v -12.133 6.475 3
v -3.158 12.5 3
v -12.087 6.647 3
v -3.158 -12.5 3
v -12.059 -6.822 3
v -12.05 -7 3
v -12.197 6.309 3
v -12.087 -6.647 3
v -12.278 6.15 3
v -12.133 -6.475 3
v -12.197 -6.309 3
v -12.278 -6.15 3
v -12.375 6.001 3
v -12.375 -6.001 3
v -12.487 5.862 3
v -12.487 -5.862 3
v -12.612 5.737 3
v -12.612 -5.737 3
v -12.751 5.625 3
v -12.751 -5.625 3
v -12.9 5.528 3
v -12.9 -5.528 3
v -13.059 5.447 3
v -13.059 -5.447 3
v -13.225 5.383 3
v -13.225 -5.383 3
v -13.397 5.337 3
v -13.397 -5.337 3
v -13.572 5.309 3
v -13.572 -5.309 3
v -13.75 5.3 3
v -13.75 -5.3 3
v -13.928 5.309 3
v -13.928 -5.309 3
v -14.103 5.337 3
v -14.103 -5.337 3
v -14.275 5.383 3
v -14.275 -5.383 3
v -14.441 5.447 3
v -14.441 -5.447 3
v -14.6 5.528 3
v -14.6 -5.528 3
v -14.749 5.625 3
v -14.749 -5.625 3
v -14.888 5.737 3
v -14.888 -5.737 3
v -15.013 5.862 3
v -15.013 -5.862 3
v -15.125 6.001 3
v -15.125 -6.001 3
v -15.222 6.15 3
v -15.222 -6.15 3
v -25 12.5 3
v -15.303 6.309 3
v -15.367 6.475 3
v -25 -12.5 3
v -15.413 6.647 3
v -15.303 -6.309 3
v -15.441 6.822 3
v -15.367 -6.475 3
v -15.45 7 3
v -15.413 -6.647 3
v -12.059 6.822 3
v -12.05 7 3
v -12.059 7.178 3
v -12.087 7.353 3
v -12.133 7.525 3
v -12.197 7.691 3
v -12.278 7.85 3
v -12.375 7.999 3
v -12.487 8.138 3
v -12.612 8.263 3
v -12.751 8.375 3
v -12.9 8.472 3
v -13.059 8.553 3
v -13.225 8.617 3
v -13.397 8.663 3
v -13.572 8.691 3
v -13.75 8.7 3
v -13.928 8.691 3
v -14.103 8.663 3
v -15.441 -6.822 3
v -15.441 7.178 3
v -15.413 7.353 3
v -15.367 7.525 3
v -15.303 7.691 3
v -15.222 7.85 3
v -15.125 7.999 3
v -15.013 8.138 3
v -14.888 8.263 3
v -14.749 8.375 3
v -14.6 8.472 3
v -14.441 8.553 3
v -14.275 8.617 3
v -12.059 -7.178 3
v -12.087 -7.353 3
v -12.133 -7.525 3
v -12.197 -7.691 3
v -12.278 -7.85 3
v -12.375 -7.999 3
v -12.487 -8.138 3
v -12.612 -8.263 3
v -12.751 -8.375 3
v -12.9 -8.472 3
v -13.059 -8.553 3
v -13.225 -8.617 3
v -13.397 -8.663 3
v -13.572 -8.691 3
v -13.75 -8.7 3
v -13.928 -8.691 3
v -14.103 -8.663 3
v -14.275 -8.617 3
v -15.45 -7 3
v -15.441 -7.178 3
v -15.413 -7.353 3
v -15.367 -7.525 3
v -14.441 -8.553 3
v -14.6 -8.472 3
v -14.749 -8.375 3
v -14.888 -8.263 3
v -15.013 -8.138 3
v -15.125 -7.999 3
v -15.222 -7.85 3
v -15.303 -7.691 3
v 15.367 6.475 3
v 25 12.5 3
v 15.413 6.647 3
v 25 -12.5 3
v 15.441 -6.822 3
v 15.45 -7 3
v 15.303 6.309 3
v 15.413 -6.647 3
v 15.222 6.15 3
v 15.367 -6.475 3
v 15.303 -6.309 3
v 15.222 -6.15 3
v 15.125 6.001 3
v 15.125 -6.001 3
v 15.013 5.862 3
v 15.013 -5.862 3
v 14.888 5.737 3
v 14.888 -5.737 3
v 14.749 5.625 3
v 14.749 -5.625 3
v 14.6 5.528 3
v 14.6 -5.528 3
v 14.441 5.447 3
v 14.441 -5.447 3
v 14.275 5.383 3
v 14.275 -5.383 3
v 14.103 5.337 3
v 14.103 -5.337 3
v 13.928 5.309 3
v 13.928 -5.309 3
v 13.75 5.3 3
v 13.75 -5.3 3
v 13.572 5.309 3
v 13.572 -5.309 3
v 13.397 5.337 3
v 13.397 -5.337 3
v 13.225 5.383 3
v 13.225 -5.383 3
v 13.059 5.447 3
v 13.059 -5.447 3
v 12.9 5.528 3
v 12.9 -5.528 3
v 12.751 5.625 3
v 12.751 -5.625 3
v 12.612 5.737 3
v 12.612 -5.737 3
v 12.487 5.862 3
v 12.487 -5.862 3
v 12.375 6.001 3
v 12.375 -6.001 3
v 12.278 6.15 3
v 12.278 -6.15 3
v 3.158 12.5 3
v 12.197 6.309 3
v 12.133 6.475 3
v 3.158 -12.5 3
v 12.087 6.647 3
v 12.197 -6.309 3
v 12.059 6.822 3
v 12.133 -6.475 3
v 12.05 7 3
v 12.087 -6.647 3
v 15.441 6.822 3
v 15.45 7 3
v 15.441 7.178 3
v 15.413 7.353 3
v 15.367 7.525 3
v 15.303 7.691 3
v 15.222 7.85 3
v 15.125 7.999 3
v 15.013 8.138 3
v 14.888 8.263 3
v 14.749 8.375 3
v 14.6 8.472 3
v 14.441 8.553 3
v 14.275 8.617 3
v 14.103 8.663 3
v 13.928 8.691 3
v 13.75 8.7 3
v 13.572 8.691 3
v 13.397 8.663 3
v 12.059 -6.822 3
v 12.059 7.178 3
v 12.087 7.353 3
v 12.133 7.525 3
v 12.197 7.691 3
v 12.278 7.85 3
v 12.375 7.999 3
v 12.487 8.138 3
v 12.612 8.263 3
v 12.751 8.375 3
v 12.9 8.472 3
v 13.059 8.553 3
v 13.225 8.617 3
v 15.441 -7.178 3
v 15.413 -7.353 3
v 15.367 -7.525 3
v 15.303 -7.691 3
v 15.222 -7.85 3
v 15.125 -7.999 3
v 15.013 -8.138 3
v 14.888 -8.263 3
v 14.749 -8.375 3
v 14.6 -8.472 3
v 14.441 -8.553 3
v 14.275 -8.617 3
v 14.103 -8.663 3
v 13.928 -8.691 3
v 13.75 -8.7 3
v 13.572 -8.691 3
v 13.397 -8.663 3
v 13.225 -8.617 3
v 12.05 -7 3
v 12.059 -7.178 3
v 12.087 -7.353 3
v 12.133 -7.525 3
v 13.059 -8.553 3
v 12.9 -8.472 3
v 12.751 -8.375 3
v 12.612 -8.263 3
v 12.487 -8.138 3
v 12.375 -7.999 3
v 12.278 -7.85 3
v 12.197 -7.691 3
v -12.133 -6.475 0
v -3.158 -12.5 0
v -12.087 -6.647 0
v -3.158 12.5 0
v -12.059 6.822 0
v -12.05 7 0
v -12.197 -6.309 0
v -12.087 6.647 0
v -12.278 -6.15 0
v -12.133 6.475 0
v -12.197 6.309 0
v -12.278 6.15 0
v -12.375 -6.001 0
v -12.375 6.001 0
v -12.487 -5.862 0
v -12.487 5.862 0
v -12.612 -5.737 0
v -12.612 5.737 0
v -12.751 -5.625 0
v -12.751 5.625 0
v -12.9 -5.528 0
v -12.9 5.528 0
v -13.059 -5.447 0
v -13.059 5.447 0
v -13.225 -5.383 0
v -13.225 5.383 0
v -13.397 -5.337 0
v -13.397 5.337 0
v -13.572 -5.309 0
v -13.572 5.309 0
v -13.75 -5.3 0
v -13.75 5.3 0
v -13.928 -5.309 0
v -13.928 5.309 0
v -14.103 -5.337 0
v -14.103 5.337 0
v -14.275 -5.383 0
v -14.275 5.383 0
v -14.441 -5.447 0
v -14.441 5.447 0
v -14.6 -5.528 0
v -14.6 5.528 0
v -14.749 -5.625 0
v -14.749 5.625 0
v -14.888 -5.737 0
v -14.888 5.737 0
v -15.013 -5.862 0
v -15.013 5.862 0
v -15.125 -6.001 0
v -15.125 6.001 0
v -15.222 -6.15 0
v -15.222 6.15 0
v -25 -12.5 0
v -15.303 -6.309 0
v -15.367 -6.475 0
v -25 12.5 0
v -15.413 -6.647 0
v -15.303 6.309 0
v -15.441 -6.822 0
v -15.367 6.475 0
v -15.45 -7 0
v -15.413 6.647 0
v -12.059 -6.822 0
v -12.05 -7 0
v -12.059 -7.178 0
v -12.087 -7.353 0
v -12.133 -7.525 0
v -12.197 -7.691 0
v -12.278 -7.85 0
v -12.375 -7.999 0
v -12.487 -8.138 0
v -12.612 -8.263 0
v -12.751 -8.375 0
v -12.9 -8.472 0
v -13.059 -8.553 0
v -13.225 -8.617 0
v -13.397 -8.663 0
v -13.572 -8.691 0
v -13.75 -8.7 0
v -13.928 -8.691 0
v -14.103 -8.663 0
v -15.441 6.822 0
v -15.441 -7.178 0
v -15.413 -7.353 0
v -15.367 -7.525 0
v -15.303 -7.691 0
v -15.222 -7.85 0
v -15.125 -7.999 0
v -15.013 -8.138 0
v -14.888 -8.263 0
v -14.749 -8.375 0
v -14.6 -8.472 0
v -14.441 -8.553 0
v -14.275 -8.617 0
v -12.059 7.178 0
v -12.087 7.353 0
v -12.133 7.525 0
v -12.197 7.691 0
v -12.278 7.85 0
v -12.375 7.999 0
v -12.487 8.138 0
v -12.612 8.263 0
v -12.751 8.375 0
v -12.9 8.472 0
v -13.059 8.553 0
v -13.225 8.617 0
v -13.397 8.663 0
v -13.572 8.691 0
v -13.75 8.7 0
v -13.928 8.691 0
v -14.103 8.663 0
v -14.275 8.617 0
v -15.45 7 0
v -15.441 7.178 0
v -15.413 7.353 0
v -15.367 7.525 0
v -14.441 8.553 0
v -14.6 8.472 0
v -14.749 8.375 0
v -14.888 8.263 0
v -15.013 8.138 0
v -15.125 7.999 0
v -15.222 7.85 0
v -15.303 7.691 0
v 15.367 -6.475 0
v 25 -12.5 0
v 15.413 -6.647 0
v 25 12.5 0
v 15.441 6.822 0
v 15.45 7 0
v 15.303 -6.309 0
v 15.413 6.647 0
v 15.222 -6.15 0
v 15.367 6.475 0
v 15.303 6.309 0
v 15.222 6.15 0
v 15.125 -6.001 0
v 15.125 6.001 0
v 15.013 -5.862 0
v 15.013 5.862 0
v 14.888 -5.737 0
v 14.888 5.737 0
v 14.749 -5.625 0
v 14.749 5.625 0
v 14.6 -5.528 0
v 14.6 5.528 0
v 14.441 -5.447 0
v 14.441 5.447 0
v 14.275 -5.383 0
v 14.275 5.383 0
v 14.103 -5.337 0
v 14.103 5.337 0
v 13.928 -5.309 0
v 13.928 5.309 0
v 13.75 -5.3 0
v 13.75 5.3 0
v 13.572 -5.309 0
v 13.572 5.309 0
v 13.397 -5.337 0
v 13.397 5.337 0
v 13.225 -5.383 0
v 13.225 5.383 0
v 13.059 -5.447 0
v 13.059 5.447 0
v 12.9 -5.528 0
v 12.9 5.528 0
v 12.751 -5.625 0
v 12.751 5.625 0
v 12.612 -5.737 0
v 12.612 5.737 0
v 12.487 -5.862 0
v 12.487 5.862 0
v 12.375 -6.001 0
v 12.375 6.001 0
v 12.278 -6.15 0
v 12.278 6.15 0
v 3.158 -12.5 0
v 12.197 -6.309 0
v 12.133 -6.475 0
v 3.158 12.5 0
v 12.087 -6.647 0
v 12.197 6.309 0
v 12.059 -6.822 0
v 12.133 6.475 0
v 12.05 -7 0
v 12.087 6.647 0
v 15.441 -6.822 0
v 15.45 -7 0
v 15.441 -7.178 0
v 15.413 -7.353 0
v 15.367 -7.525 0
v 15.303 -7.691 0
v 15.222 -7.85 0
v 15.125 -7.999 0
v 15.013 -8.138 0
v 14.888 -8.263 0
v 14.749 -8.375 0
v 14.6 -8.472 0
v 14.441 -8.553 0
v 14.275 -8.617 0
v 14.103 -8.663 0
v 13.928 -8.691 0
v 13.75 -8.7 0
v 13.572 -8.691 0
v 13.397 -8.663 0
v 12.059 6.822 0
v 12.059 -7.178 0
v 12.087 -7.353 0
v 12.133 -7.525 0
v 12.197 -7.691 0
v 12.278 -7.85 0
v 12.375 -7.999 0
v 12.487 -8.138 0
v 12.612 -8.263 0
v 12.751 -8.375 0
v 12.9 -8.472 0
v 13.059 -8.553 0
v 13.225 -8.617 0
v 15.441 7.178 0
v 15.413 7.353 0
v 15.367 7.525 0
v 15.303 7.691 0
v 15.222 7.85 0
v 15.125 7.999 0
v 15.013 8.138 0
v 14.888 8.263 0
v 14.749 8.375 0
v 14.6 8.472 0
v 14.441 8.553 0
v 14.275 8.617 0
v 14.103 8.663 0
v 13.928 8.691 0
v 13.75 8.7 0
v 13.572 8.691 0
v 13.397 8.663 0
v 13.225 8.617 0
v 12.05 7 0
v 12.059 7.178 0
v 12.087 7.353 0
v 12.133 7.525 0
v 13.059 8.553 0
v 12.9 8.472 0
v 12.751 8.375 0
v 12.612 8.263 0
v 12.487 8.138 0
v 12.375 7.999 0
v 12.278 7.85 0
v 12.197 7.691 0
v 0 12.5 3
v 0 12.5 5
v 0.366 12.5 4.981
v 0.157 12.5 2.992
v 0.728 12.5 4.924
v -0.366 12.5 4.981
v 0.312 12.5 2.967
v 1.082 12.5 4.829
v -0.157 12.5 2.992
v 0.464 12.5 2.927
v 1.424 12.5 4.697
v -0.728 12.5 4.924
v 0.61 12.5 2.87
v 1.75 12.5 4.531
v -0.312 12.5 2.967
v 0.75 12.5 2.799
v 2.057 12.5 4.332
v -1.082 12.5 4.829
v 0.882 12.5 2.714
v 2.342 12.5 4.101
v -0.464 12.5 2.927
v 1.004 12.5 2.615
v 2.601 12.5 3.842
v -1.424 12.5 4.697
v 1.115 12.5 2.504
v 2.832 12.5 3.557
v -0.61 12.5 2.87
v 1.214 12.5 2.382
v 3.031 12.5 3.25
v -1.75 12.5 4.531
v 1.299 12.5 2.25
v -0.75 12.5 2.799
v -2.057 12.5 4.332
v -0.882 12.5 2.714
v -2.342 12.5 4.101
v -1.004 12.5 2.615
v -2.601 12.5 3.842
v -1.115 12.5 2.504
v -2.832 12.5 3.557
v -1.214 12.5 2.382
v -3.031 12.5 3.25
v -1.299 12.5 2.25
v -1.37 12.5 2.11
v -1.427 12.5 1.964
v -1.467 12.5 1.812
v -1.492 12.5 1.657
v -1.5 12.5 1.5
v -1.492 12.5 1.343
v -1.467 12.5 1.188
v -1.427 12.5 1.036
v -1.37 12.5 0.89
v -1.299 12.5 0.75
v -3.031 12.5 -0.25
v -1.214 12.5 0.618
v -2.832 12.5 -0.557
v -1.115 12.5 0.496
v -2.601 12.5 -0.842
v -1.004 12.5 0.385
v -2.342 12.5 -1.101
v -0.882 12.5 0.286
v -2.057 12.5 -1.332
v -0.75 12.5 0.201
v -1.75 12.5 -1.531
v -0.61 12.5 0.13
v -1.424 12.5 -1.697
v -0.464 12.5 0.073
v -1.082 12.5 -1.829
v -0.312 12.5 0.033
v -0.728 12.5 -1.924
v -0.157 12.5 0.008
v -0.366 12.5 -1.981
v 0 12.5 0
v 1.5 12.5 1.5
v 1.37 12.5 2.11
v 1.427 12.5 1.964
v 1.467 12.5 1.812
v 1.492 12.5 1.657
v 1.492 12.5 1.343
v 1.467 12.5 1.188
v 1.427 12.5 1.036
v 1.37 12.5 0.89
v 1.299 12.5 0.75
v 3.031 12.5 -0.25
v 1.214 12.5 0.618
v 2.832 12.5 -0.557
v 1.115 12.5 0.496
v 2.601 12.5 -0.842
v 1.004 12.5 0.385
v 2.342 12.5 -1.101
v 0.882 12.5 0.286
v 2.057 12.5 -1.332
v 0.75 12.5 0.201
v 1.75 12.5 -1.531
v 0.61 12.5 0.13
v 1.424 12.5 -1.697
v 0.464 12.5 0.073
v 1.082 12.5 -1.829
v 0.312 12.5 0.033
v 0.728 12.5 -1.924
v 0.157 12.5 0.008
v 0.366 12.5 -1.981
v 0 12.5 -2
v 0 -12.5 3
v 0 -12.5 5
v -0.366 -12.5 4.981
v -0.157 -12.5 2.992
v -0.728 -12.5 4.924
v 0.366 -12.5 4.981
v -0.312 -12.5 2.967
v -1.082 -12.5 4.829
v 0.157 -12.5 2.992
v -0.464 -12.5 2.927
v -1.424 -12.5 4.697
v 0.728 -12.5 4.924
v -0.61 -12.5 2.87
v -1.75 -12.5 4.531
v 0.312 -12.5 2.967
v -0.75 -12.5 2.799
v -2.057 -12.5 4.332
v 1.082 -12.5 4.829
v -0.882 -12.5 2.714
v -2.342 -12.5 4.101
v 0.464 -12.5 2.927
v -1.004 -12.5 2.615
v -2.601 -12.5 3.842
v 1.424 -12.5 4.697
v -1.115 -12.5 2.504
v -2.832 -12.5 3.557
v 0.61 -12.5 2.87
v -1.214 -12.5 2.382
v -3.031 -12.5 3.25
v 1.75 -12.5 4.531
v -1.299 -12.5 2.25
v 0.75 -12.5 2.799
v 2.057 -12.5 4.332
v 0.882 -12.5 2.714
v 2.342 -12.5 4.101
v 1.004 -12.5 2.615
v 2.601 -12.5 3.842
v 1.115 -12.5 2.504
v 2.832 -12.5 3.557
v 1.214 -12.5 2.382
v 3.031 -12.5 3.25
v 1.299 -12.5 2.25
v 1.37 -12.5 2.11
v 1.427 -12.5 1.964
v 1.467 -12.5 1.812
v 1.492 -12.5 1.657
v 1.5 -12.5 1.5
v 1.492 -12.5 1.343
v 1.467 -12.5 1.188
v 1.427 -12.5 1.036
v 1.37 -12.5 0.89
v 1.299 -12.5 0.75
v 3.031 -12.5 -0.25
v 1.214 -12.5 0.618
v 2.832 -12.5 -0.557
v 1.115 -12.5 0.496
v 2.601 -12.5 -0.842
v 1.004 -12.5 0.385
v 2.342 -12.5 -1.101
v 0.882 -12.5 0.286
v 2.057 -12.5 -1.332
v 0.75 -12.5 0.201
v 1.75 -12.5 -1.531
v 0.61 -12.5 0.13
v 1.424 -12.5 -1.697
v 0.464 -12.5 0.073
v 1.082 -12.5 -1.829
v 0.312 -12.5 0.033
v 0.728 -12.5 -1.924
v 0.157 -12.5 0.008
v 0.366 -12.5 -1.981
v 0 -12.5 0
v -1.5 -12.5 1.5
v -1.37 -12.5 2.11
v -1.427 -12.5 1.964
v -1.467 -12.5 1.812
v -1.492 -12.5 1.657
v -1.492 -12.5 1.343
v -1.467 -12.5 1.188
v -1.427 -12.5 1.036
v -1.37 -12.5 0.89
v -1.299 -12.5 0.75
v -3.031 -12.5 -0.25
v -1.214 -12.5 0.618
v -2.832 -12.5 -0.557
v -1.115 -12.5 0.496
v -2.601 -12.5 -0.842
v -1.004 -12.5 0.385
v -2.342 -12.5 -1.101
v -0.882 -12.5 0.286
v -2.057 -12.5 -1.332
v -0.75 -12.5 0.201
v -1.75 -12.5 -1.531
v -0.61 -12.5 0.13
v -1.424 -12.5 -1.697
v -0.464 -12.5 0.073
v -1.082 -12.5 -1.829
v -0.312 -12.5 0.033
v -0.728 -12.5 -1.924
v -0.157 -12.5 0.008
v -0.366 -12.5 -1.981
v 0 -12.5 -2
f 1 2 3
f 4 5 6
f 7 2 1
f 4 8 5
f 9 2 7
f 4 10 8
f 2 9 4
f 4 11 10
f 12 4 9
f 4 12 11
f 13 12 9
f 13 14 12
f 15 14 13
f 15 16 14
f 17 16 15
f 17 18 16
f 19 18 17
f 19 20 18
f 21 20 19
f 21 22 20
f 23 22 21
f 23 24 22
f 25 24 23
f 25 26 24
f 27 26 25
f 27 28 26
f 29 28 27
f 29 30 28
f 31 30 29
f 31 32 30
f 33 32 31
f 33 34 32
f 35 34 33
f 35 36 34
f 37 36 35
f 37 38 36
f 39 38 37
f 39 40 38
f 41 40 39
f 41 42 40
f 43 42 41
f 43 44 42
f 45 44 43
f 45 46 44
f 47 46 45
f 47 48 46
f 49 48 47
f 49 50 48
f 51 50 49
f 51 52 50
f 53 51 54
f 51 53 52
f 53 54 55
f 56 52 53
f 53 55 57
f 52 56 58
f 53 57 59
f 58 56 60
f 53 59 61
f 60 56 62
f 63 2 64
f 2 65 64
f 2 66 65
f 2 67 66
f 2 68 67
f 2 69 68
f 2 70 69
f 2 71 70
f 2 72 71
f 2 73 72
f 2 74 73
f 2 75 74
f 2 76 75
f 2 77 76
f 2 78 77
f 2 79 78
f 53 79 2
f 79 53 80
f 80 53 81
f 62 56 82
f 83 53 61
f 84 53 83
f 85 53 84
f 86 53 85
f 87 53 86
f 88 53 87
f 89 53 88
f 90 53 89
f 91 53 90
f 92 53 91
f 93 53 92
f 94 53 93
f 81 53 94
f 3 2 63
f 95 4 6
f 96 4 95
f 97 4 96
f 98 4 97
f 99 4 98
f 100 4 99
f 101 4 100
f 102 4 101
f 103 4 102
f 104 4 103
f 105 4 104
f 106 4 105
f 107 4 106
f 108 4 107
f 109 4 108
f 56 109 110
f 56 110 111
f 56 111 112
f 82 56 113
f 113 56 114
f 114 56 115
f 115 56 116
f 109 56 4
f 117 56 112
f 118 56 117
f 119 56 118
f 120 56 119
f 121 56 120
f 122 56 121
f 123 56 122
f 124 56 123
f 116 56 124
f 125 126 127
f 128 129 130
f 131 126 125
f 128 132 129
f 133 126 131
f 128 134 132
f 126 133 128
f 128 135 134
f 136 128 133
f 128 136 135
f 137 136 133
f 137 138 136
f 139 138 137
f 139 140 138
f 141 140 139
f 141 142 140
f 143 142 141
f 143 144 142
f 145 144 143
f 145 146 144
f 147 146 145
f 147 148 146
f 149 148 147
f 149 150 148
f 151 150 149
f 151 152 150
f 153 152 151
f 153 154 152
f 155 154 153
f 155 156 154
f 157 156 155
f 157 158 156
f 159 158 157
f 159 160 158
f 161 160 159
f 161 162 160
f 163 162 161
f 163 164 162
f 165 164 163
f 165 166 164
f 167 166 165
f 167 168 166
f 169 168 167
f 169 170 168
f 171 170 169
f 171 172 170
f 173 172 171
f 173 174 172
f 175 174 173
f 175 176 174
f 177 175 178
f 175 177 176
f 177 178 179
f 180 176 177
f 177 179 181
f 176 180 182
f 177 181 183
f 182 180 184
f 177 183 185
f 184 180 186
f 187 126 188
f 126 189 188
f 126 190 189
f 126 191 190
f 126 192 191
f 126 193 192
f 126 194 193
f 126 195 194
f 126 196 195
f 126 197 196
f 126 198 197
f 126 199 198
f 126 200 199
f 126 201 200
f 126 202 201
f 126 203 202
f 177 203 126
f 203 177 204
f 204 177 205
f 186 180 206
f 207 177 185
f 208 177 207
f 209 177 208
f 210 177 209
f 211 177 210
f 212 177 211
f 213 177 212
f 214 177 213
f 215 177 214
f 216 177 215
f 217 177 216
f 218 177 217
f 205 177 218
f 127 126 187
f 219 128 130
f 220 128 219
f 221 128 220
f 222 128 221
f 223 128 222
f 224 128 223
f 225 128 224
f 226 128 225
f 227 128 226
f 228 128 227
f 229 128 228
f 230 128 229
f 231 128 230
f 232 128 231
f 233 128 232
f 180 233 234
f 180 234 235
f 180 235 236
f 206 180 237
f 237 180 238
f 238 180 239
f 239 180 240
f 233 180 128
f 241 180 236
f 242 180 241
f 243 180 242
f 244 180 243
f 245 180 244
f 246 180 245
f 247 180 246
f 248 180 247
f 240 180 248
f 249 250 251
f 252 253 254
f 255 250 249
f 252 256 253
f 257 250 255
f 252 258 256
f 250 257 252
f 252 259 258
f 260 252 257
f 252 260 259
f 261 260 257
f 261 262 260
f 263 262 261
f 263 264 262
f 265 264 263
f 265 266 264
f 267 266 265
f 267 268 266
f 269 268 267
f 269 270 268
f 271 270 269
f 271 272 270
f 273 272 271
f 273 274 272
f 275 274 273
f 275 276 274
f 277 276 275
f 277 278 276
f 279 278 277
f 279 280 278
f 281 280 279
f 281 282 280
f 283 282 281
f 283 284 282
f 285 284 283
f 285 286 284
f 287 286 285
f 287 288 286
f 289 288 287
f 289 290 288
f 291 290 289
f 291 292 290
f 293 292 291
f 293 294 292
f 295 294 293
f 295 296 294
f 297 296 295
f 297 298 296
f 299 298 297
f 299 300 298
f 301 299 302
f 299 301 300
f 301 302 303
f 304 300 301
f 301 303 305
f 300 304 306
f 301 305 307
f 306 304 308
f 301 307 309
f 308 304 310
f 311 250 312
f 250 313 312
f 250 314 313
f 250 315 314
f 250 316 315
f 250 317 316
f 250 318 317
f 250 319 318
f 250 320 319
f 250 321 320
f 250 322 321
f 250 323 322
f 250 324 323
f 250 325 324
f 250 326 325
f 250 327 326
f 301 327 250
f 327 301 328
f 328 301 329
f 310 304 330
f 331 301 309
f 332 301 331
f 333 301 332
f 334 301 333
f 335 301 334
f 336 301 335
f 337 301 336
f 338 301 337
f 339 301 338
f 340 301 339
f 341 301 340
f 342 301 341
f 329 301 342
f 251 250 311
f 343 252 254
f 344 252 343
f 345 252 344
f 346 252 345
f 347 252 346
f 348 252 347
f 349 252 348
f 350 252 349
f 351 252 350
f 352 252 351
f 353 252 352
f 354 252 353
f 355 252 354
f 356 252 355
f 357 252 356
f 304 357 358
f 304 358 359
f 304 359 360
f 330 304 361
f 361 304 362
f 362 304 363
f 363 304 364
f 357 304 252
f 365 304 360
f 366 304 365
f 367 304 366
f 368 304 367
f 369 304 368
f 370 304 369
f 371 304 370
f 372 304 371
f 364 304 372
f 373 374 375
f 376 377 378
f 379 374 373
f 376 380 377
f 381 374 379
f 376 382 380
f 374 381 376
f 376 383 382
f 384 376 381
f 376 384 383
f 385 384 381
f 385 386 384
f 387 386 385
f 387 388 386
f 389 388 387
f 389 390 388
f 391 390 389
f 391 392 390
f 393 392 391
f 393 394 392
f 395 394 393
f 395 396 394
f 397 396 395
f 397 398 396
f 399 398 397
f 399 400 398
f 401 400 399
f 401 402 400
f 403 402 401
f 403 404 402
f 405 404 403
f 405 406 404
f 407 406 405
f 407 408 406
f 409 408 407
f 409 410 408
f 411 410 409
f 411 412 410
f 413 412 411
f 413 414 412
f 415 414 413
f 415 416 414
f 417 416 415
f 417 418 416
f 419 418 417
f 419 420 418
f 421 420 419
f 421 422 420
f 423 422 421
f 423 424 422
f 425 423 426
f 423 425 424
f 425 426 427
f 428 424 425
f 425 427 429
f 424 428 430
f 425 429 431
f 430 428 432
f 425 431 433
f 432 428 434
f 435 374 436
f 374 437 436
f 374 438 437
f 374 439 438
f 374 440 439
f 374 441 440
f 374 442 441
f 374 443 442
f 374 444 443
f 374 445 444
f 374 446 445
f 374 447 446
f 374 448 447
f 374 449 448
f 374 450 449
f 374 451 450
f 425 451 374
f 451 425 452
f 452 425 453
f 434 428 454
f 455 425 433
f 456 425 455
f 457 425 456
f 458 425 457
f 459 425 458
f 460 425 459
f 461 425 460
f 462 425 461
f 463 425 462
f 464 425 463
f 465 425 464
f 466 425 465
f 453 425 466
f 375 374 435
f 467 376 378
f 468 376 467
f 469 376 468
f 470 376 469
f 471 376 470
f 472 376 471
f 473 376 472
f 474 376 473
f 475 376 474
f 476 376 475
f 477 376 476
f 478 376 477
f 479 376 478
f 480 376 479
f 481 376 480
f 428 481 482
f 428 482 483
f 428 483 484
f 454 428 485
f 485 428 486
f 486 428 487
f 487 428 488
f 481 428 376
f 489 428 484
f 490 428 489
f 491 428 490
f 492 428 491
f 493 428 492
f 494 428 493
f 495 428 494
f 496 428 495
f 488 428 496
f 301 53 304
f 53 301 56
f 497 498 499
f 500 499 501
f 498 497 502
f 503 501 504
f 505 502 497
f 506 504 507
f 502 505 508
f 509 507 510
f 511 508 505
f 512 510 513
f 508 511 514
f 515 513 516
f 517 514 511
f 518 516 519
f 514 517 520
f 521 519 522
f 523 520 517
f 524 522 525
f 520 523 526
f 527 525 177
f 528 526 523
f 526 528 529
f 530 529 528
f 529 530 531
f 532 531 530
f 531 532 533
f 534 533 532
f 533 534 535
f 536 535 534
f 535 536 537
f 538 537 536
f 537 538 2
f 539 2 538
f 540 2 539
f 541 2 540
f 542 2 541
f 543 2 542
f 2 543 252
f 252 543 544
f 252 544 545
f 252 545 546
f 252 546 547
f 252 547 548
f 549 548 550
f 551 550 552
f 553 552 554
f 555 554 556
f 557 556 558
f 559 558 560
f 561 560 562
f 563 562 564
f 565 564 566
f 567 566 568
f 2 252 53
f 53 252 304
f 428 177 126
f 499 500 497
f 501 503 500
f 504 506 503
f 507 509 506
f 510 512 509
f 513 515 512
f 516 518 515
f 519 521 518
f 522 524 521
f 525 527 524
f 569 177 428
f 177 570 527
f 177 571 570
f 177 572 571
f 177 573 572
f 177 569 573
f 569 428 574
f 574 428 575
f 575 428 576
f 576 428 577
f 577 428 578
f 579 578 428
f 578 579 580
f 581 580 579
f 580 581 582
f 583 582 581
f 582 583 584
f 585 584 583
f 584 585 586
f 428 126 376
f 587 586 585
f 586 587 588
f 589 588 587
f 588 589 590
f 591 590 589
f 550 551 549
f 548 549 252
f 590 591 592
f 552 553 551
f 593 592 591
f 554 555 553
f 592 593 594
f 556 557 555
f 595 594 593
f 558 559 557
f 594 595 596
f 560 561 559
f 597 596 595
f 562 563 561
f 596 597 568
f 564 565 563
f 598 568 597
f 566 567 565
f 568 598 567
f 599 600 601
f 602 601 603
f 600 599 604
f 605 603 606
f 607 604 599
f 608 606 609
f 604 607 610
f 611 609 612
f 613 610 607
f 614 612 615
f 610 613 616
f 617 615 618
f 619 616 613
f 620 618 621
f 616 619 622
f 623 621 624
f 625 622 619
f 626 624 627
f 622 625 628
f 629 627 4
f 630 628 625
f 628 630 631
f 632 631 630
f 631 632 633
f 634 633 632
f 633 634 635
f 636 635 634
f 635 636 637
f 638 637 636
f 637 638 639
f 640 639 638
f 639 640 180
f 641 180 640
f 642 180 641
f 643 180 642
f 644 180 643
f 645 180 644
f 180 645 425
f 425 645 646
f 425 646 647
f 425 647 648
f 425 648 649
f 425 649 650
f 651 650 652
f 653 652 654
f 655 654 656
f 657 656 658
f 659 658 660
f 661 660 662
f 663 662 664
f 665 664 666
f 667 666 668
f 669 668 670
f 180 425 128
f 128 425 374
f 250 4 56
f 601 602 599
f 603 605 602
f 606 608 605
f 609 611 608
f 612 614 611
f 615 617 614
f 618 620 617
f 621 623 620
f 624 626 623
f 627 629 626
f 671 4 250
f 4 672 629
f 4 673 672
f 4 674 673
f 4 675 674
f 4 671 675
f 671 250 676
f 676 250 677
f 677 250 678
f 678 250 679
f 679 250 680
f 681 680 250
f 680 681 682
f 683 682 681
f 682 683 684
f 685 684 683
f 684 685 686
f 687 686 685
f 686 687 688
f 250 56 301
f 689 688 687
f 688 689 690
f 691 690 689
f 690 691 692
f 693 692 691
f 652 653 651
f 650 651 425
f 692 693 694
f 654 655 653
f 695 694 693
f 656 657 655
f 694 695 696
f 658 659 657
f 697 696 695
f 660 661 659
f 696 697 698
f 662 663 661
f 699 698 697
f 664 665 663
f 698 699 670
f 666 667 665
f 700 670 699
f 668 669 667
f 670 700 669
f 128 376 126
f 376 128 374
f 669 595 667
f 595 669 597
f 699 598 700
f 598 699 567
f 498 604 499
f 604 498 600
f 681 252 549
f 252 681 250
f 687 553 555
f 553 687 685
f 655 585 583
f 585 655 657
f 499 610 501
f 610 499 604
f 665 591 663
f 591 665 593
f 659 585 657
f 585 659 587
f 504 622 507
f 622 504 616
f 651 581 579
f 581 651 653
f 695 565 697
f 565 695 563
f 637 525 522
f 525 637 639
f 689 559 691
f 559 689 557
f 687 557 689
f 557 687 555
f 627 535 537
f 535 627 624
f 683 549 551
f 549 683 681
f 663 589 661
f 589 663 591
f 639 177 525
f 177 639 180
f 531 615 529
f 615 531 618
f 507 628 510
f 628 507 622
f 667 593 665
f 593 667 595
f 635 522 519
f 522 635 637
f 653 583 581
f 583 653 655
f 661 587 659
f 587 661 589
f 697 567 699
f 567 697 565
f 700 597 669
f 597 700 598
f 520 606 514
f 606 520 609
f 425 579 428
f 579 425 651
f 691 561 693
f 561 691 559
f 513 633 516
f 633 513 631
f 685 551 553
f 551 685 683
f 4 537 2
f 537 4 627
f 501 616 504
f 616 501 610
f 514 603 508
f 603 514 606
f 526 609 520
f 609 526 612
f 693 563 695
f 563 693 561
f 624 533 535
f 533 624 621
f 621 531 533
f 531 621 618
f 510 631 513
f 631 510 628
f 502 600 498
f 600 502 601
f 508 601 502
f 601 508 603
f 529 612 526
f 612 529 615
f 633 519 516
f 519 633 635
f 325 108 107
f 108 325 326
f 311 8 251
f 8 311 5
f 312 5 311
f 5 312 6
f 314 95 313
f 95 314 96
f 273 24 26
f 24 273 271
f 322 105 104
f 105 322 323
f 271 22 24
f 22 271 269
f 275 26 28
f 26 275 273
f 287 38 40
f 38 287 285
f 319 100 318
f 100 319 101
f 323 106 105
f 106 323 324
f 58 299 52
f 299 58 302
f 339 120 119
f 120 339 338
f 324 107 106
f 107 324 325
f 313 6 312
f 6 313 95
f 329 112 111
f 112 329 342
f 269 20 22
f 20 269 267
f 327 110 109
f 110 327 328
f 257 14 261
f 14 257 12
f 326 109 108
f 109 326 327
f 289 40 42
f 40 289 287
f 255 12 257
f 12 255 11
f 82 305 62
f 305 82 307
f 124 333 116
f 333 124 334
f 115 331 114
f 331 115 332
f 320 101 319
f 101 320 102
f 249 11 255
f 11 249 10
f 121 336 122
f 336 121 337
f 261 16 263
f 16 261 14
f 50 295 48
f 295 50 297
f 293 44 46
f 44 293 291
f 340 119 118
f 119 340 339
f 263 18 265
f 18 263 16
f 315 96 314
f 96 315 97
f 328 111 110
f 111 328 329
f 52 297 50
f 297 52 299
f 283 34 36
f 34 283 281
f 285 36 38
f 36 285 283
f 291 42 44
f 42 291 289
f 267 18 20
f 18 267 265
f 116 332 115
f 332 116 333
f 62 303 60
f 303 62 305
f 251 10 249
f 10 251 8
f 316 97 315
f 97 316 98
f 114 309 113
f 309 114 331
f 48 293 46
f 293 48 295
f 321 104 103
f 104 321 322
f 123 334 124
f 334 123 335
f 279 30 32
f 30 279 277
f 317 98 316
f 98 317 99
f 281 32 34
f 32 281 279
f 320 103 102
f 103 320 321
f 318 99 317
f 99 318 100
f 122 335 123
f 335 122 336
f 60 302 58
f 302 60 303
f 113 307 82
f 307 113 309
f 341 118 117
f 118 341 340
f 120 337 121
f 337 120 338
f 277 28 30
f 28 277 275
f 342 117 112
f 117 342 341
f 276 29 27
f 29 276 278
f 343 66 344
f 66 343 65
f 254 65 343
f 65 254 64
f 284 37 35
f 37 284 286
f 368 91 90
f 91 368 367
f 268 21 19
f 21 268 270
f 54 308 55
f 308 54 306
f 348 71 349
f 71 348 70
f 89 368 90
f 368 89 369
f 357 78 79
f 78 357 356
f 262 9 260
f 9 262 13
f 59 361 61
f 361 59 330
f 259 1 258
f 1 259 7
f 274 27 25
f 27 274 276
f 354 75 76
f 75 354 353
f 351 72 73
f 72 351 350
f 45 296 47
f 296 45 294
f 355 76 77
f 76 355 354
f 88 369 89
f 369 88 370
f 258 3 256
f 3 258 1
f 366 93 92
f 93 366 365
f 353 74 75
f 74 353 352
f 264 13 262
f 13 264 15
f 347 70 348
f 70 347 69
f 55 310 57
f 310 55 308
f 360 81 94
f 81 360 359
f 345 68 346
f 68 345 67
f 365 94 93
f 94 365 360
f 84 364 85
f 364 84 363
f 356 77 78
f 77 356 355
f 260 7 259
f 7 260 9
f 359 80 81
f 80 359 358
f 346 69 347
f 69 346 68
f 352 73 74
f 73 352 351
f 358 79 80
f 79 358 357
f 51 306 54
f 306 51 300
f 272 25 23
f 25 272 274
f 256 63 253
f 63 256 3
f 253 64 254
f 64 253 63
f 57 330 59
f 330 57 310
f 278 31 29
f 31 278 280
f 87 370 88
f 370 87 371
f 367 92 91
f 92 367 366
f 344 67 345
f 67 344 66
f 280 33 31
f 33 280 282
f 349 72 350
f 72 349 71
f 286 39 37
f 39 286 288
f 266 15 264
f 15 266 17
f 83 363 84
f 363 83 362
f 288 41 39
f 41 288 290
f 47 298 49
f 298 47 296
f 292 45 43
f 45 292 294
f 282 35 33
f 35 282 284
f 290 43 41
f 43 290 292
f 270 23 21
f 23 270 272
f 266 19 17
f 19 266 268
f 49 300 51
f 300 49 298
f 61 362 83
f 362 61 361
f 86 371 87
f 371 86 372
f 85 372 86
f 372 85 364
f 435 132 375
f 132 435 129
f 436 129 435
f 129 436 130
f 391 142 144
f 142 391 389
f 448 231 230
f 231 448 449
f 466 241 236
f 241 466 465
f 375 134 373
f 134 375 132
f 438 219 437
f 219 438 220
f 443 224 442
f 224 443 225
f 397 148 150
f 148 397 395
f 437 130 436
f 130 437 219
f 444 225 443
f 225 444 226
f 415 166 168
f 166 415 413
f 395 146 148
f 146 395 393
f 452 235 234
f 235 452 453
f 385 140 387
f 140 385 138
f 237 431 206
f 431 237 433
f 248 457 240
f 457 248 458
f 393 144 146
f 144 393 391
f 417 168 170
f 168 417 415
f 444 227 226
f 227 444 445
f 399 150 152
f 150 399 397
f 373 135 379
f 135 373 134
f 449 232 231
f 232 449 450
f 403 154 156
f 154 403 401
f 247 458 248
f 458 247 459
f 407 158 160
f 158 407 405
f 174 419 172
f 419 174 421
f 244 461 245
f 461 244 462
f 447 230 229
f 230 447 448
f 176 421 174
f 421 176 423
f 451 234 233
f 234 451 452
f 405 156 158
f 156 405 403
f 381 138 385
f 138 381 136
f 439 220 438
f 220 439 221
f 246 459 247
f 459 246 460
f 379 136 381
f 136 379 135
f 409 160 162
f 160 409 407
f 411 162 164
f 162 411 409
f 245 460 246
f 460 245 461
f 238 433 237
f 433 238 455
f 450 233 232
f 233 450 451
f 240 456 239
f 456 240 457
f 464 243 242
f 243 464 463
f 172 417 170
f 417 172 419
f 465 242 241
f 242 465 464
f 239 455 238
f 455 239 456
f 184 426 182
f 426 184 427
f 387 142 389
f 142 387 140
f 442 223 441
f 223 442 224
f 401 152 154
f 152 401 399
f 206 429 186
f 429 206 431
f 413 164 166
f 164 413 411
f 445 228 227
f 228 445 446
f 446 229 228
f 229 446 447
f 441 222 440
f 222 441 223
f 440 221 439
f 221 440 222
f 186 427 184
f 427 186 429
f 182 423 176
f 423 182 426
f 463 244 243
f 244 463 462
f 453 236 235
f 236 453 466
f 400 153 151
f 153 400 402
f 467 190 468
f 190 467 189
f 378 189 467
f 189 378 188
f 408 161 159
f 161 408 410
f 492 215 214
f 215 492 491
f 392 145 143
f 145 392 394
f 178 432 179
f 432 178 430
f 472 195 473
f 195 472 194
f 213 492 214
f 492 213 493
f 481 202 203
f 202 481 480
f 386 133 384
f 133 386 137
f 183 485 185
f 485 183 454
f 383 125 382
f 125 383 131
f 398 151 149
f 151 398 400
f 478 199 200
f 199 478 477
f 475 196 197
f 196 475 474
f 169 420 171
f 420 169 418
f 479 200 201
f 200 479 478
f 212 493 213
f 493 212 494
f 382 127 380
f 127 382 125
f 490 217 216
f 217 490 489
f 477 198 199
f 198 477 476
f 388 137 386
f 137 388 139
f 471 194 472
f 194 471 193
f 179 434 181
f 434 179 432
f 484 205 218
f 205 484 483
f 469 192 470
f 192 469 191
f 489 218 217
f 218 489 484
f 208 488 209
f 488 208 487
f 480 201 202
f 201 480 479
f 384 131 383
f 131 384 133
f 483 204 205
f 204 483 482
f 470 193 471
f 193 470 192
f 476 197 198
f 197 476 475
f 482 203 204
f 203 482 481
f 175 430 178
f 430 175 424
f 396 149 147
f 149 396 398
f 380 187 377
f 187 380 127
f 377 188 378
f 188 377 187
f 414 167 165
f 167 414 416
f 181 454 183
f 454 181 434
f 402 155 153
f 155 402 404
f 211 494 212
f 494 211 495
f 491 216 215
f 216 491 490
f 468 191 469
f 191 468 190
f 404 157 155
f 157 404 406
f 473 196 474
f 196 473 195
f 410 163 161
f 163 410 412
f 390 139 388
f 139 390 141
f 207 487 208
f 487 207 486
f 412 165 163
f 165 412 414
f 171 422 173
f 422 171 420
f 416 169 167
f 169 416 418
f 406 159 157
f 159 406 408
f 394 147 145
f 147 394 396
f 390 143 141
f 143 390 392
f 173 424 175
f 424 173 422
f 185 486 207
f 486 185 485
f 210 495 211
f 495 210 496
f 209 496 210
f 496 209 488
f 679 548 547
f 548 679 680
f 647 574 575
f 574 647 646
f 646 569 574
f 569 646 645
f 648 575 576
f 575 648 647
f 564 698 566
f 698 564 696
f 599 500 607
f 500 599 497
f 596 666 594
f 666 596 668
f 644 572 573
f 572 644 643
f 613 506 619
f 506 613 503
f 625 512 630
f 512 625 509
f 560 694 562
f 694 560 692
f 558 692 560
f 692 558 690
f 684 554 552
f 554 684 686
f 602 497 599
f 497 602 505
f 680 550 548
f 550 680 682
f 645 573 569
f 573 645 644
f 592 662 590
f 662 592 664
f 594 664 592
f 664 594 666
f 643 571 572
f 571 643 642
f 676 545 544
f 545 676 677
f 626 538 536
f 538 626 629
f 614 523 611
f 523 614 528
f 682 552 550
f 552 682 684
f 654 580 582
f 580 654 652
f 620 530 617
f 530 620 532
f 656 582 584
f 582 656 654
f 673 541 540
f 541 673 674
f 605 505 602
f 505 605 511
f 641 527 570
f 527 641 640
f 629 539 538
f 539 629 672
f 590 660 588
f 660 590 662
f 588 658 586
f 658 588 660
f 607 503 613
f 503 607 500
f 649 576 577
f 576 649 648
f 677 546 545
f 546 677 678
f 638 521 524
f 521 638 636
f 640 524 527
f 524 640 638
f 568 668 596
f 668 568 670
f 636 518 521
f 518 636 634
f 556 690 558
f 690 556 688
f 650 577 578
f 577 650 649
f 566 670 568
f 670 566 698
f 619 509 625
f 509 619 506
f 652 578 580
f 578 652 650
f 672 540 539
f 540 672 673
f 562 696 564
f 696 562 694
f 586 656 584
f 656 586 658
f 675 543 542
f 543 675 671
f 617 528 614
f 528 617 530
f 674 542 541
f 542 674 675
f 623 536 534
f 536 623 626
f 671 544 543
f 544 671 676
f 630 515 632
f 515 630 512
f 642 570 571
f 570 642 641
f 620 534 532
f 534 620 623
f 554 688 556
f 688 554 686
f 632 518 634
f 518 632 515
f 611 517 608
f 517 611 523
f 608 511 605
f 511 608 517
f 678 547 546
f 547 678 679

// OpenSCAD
// Two-leaf hinge with a printable straight pin barrel.
$fn = 60;
eps = 0.02;
leaf_l = 25;
leaf_w = 25;
leaf_t = 3;
pin_d = 3;
barrel_d = pin_d + 4;
difference() {
    union() {
        translate([-leaf_l, -leaf_w / 2, 0]) cube([leaf_l, leaf_w, leaf_t]);
        translate([0, -leaf_w / 2, 0]) cube([leaf_l, leaf_w, leaf_t]);
        translate([0, -leaf_w / 2, leaf_t / 2]) rotate([-90, 0, 0]) cylinder(d = barrel_d, h = leaf_w);
    }
    translate([0, -leaf_w / 2 - eps, leaf_t / 2]) rotate([-90, 0, 0]) cylinder(d = pin_d, h = leaf_w + 2 * eps);
    for (x = [-leaf_l * 0.55, leaf_l * 0.55], y = [-leaf_w * 0.28, leaf_w * 0.28])
        translate([x, y, -eps]) cylinder(d = 3.4, h = leaf_t + 2 * eps);
}
